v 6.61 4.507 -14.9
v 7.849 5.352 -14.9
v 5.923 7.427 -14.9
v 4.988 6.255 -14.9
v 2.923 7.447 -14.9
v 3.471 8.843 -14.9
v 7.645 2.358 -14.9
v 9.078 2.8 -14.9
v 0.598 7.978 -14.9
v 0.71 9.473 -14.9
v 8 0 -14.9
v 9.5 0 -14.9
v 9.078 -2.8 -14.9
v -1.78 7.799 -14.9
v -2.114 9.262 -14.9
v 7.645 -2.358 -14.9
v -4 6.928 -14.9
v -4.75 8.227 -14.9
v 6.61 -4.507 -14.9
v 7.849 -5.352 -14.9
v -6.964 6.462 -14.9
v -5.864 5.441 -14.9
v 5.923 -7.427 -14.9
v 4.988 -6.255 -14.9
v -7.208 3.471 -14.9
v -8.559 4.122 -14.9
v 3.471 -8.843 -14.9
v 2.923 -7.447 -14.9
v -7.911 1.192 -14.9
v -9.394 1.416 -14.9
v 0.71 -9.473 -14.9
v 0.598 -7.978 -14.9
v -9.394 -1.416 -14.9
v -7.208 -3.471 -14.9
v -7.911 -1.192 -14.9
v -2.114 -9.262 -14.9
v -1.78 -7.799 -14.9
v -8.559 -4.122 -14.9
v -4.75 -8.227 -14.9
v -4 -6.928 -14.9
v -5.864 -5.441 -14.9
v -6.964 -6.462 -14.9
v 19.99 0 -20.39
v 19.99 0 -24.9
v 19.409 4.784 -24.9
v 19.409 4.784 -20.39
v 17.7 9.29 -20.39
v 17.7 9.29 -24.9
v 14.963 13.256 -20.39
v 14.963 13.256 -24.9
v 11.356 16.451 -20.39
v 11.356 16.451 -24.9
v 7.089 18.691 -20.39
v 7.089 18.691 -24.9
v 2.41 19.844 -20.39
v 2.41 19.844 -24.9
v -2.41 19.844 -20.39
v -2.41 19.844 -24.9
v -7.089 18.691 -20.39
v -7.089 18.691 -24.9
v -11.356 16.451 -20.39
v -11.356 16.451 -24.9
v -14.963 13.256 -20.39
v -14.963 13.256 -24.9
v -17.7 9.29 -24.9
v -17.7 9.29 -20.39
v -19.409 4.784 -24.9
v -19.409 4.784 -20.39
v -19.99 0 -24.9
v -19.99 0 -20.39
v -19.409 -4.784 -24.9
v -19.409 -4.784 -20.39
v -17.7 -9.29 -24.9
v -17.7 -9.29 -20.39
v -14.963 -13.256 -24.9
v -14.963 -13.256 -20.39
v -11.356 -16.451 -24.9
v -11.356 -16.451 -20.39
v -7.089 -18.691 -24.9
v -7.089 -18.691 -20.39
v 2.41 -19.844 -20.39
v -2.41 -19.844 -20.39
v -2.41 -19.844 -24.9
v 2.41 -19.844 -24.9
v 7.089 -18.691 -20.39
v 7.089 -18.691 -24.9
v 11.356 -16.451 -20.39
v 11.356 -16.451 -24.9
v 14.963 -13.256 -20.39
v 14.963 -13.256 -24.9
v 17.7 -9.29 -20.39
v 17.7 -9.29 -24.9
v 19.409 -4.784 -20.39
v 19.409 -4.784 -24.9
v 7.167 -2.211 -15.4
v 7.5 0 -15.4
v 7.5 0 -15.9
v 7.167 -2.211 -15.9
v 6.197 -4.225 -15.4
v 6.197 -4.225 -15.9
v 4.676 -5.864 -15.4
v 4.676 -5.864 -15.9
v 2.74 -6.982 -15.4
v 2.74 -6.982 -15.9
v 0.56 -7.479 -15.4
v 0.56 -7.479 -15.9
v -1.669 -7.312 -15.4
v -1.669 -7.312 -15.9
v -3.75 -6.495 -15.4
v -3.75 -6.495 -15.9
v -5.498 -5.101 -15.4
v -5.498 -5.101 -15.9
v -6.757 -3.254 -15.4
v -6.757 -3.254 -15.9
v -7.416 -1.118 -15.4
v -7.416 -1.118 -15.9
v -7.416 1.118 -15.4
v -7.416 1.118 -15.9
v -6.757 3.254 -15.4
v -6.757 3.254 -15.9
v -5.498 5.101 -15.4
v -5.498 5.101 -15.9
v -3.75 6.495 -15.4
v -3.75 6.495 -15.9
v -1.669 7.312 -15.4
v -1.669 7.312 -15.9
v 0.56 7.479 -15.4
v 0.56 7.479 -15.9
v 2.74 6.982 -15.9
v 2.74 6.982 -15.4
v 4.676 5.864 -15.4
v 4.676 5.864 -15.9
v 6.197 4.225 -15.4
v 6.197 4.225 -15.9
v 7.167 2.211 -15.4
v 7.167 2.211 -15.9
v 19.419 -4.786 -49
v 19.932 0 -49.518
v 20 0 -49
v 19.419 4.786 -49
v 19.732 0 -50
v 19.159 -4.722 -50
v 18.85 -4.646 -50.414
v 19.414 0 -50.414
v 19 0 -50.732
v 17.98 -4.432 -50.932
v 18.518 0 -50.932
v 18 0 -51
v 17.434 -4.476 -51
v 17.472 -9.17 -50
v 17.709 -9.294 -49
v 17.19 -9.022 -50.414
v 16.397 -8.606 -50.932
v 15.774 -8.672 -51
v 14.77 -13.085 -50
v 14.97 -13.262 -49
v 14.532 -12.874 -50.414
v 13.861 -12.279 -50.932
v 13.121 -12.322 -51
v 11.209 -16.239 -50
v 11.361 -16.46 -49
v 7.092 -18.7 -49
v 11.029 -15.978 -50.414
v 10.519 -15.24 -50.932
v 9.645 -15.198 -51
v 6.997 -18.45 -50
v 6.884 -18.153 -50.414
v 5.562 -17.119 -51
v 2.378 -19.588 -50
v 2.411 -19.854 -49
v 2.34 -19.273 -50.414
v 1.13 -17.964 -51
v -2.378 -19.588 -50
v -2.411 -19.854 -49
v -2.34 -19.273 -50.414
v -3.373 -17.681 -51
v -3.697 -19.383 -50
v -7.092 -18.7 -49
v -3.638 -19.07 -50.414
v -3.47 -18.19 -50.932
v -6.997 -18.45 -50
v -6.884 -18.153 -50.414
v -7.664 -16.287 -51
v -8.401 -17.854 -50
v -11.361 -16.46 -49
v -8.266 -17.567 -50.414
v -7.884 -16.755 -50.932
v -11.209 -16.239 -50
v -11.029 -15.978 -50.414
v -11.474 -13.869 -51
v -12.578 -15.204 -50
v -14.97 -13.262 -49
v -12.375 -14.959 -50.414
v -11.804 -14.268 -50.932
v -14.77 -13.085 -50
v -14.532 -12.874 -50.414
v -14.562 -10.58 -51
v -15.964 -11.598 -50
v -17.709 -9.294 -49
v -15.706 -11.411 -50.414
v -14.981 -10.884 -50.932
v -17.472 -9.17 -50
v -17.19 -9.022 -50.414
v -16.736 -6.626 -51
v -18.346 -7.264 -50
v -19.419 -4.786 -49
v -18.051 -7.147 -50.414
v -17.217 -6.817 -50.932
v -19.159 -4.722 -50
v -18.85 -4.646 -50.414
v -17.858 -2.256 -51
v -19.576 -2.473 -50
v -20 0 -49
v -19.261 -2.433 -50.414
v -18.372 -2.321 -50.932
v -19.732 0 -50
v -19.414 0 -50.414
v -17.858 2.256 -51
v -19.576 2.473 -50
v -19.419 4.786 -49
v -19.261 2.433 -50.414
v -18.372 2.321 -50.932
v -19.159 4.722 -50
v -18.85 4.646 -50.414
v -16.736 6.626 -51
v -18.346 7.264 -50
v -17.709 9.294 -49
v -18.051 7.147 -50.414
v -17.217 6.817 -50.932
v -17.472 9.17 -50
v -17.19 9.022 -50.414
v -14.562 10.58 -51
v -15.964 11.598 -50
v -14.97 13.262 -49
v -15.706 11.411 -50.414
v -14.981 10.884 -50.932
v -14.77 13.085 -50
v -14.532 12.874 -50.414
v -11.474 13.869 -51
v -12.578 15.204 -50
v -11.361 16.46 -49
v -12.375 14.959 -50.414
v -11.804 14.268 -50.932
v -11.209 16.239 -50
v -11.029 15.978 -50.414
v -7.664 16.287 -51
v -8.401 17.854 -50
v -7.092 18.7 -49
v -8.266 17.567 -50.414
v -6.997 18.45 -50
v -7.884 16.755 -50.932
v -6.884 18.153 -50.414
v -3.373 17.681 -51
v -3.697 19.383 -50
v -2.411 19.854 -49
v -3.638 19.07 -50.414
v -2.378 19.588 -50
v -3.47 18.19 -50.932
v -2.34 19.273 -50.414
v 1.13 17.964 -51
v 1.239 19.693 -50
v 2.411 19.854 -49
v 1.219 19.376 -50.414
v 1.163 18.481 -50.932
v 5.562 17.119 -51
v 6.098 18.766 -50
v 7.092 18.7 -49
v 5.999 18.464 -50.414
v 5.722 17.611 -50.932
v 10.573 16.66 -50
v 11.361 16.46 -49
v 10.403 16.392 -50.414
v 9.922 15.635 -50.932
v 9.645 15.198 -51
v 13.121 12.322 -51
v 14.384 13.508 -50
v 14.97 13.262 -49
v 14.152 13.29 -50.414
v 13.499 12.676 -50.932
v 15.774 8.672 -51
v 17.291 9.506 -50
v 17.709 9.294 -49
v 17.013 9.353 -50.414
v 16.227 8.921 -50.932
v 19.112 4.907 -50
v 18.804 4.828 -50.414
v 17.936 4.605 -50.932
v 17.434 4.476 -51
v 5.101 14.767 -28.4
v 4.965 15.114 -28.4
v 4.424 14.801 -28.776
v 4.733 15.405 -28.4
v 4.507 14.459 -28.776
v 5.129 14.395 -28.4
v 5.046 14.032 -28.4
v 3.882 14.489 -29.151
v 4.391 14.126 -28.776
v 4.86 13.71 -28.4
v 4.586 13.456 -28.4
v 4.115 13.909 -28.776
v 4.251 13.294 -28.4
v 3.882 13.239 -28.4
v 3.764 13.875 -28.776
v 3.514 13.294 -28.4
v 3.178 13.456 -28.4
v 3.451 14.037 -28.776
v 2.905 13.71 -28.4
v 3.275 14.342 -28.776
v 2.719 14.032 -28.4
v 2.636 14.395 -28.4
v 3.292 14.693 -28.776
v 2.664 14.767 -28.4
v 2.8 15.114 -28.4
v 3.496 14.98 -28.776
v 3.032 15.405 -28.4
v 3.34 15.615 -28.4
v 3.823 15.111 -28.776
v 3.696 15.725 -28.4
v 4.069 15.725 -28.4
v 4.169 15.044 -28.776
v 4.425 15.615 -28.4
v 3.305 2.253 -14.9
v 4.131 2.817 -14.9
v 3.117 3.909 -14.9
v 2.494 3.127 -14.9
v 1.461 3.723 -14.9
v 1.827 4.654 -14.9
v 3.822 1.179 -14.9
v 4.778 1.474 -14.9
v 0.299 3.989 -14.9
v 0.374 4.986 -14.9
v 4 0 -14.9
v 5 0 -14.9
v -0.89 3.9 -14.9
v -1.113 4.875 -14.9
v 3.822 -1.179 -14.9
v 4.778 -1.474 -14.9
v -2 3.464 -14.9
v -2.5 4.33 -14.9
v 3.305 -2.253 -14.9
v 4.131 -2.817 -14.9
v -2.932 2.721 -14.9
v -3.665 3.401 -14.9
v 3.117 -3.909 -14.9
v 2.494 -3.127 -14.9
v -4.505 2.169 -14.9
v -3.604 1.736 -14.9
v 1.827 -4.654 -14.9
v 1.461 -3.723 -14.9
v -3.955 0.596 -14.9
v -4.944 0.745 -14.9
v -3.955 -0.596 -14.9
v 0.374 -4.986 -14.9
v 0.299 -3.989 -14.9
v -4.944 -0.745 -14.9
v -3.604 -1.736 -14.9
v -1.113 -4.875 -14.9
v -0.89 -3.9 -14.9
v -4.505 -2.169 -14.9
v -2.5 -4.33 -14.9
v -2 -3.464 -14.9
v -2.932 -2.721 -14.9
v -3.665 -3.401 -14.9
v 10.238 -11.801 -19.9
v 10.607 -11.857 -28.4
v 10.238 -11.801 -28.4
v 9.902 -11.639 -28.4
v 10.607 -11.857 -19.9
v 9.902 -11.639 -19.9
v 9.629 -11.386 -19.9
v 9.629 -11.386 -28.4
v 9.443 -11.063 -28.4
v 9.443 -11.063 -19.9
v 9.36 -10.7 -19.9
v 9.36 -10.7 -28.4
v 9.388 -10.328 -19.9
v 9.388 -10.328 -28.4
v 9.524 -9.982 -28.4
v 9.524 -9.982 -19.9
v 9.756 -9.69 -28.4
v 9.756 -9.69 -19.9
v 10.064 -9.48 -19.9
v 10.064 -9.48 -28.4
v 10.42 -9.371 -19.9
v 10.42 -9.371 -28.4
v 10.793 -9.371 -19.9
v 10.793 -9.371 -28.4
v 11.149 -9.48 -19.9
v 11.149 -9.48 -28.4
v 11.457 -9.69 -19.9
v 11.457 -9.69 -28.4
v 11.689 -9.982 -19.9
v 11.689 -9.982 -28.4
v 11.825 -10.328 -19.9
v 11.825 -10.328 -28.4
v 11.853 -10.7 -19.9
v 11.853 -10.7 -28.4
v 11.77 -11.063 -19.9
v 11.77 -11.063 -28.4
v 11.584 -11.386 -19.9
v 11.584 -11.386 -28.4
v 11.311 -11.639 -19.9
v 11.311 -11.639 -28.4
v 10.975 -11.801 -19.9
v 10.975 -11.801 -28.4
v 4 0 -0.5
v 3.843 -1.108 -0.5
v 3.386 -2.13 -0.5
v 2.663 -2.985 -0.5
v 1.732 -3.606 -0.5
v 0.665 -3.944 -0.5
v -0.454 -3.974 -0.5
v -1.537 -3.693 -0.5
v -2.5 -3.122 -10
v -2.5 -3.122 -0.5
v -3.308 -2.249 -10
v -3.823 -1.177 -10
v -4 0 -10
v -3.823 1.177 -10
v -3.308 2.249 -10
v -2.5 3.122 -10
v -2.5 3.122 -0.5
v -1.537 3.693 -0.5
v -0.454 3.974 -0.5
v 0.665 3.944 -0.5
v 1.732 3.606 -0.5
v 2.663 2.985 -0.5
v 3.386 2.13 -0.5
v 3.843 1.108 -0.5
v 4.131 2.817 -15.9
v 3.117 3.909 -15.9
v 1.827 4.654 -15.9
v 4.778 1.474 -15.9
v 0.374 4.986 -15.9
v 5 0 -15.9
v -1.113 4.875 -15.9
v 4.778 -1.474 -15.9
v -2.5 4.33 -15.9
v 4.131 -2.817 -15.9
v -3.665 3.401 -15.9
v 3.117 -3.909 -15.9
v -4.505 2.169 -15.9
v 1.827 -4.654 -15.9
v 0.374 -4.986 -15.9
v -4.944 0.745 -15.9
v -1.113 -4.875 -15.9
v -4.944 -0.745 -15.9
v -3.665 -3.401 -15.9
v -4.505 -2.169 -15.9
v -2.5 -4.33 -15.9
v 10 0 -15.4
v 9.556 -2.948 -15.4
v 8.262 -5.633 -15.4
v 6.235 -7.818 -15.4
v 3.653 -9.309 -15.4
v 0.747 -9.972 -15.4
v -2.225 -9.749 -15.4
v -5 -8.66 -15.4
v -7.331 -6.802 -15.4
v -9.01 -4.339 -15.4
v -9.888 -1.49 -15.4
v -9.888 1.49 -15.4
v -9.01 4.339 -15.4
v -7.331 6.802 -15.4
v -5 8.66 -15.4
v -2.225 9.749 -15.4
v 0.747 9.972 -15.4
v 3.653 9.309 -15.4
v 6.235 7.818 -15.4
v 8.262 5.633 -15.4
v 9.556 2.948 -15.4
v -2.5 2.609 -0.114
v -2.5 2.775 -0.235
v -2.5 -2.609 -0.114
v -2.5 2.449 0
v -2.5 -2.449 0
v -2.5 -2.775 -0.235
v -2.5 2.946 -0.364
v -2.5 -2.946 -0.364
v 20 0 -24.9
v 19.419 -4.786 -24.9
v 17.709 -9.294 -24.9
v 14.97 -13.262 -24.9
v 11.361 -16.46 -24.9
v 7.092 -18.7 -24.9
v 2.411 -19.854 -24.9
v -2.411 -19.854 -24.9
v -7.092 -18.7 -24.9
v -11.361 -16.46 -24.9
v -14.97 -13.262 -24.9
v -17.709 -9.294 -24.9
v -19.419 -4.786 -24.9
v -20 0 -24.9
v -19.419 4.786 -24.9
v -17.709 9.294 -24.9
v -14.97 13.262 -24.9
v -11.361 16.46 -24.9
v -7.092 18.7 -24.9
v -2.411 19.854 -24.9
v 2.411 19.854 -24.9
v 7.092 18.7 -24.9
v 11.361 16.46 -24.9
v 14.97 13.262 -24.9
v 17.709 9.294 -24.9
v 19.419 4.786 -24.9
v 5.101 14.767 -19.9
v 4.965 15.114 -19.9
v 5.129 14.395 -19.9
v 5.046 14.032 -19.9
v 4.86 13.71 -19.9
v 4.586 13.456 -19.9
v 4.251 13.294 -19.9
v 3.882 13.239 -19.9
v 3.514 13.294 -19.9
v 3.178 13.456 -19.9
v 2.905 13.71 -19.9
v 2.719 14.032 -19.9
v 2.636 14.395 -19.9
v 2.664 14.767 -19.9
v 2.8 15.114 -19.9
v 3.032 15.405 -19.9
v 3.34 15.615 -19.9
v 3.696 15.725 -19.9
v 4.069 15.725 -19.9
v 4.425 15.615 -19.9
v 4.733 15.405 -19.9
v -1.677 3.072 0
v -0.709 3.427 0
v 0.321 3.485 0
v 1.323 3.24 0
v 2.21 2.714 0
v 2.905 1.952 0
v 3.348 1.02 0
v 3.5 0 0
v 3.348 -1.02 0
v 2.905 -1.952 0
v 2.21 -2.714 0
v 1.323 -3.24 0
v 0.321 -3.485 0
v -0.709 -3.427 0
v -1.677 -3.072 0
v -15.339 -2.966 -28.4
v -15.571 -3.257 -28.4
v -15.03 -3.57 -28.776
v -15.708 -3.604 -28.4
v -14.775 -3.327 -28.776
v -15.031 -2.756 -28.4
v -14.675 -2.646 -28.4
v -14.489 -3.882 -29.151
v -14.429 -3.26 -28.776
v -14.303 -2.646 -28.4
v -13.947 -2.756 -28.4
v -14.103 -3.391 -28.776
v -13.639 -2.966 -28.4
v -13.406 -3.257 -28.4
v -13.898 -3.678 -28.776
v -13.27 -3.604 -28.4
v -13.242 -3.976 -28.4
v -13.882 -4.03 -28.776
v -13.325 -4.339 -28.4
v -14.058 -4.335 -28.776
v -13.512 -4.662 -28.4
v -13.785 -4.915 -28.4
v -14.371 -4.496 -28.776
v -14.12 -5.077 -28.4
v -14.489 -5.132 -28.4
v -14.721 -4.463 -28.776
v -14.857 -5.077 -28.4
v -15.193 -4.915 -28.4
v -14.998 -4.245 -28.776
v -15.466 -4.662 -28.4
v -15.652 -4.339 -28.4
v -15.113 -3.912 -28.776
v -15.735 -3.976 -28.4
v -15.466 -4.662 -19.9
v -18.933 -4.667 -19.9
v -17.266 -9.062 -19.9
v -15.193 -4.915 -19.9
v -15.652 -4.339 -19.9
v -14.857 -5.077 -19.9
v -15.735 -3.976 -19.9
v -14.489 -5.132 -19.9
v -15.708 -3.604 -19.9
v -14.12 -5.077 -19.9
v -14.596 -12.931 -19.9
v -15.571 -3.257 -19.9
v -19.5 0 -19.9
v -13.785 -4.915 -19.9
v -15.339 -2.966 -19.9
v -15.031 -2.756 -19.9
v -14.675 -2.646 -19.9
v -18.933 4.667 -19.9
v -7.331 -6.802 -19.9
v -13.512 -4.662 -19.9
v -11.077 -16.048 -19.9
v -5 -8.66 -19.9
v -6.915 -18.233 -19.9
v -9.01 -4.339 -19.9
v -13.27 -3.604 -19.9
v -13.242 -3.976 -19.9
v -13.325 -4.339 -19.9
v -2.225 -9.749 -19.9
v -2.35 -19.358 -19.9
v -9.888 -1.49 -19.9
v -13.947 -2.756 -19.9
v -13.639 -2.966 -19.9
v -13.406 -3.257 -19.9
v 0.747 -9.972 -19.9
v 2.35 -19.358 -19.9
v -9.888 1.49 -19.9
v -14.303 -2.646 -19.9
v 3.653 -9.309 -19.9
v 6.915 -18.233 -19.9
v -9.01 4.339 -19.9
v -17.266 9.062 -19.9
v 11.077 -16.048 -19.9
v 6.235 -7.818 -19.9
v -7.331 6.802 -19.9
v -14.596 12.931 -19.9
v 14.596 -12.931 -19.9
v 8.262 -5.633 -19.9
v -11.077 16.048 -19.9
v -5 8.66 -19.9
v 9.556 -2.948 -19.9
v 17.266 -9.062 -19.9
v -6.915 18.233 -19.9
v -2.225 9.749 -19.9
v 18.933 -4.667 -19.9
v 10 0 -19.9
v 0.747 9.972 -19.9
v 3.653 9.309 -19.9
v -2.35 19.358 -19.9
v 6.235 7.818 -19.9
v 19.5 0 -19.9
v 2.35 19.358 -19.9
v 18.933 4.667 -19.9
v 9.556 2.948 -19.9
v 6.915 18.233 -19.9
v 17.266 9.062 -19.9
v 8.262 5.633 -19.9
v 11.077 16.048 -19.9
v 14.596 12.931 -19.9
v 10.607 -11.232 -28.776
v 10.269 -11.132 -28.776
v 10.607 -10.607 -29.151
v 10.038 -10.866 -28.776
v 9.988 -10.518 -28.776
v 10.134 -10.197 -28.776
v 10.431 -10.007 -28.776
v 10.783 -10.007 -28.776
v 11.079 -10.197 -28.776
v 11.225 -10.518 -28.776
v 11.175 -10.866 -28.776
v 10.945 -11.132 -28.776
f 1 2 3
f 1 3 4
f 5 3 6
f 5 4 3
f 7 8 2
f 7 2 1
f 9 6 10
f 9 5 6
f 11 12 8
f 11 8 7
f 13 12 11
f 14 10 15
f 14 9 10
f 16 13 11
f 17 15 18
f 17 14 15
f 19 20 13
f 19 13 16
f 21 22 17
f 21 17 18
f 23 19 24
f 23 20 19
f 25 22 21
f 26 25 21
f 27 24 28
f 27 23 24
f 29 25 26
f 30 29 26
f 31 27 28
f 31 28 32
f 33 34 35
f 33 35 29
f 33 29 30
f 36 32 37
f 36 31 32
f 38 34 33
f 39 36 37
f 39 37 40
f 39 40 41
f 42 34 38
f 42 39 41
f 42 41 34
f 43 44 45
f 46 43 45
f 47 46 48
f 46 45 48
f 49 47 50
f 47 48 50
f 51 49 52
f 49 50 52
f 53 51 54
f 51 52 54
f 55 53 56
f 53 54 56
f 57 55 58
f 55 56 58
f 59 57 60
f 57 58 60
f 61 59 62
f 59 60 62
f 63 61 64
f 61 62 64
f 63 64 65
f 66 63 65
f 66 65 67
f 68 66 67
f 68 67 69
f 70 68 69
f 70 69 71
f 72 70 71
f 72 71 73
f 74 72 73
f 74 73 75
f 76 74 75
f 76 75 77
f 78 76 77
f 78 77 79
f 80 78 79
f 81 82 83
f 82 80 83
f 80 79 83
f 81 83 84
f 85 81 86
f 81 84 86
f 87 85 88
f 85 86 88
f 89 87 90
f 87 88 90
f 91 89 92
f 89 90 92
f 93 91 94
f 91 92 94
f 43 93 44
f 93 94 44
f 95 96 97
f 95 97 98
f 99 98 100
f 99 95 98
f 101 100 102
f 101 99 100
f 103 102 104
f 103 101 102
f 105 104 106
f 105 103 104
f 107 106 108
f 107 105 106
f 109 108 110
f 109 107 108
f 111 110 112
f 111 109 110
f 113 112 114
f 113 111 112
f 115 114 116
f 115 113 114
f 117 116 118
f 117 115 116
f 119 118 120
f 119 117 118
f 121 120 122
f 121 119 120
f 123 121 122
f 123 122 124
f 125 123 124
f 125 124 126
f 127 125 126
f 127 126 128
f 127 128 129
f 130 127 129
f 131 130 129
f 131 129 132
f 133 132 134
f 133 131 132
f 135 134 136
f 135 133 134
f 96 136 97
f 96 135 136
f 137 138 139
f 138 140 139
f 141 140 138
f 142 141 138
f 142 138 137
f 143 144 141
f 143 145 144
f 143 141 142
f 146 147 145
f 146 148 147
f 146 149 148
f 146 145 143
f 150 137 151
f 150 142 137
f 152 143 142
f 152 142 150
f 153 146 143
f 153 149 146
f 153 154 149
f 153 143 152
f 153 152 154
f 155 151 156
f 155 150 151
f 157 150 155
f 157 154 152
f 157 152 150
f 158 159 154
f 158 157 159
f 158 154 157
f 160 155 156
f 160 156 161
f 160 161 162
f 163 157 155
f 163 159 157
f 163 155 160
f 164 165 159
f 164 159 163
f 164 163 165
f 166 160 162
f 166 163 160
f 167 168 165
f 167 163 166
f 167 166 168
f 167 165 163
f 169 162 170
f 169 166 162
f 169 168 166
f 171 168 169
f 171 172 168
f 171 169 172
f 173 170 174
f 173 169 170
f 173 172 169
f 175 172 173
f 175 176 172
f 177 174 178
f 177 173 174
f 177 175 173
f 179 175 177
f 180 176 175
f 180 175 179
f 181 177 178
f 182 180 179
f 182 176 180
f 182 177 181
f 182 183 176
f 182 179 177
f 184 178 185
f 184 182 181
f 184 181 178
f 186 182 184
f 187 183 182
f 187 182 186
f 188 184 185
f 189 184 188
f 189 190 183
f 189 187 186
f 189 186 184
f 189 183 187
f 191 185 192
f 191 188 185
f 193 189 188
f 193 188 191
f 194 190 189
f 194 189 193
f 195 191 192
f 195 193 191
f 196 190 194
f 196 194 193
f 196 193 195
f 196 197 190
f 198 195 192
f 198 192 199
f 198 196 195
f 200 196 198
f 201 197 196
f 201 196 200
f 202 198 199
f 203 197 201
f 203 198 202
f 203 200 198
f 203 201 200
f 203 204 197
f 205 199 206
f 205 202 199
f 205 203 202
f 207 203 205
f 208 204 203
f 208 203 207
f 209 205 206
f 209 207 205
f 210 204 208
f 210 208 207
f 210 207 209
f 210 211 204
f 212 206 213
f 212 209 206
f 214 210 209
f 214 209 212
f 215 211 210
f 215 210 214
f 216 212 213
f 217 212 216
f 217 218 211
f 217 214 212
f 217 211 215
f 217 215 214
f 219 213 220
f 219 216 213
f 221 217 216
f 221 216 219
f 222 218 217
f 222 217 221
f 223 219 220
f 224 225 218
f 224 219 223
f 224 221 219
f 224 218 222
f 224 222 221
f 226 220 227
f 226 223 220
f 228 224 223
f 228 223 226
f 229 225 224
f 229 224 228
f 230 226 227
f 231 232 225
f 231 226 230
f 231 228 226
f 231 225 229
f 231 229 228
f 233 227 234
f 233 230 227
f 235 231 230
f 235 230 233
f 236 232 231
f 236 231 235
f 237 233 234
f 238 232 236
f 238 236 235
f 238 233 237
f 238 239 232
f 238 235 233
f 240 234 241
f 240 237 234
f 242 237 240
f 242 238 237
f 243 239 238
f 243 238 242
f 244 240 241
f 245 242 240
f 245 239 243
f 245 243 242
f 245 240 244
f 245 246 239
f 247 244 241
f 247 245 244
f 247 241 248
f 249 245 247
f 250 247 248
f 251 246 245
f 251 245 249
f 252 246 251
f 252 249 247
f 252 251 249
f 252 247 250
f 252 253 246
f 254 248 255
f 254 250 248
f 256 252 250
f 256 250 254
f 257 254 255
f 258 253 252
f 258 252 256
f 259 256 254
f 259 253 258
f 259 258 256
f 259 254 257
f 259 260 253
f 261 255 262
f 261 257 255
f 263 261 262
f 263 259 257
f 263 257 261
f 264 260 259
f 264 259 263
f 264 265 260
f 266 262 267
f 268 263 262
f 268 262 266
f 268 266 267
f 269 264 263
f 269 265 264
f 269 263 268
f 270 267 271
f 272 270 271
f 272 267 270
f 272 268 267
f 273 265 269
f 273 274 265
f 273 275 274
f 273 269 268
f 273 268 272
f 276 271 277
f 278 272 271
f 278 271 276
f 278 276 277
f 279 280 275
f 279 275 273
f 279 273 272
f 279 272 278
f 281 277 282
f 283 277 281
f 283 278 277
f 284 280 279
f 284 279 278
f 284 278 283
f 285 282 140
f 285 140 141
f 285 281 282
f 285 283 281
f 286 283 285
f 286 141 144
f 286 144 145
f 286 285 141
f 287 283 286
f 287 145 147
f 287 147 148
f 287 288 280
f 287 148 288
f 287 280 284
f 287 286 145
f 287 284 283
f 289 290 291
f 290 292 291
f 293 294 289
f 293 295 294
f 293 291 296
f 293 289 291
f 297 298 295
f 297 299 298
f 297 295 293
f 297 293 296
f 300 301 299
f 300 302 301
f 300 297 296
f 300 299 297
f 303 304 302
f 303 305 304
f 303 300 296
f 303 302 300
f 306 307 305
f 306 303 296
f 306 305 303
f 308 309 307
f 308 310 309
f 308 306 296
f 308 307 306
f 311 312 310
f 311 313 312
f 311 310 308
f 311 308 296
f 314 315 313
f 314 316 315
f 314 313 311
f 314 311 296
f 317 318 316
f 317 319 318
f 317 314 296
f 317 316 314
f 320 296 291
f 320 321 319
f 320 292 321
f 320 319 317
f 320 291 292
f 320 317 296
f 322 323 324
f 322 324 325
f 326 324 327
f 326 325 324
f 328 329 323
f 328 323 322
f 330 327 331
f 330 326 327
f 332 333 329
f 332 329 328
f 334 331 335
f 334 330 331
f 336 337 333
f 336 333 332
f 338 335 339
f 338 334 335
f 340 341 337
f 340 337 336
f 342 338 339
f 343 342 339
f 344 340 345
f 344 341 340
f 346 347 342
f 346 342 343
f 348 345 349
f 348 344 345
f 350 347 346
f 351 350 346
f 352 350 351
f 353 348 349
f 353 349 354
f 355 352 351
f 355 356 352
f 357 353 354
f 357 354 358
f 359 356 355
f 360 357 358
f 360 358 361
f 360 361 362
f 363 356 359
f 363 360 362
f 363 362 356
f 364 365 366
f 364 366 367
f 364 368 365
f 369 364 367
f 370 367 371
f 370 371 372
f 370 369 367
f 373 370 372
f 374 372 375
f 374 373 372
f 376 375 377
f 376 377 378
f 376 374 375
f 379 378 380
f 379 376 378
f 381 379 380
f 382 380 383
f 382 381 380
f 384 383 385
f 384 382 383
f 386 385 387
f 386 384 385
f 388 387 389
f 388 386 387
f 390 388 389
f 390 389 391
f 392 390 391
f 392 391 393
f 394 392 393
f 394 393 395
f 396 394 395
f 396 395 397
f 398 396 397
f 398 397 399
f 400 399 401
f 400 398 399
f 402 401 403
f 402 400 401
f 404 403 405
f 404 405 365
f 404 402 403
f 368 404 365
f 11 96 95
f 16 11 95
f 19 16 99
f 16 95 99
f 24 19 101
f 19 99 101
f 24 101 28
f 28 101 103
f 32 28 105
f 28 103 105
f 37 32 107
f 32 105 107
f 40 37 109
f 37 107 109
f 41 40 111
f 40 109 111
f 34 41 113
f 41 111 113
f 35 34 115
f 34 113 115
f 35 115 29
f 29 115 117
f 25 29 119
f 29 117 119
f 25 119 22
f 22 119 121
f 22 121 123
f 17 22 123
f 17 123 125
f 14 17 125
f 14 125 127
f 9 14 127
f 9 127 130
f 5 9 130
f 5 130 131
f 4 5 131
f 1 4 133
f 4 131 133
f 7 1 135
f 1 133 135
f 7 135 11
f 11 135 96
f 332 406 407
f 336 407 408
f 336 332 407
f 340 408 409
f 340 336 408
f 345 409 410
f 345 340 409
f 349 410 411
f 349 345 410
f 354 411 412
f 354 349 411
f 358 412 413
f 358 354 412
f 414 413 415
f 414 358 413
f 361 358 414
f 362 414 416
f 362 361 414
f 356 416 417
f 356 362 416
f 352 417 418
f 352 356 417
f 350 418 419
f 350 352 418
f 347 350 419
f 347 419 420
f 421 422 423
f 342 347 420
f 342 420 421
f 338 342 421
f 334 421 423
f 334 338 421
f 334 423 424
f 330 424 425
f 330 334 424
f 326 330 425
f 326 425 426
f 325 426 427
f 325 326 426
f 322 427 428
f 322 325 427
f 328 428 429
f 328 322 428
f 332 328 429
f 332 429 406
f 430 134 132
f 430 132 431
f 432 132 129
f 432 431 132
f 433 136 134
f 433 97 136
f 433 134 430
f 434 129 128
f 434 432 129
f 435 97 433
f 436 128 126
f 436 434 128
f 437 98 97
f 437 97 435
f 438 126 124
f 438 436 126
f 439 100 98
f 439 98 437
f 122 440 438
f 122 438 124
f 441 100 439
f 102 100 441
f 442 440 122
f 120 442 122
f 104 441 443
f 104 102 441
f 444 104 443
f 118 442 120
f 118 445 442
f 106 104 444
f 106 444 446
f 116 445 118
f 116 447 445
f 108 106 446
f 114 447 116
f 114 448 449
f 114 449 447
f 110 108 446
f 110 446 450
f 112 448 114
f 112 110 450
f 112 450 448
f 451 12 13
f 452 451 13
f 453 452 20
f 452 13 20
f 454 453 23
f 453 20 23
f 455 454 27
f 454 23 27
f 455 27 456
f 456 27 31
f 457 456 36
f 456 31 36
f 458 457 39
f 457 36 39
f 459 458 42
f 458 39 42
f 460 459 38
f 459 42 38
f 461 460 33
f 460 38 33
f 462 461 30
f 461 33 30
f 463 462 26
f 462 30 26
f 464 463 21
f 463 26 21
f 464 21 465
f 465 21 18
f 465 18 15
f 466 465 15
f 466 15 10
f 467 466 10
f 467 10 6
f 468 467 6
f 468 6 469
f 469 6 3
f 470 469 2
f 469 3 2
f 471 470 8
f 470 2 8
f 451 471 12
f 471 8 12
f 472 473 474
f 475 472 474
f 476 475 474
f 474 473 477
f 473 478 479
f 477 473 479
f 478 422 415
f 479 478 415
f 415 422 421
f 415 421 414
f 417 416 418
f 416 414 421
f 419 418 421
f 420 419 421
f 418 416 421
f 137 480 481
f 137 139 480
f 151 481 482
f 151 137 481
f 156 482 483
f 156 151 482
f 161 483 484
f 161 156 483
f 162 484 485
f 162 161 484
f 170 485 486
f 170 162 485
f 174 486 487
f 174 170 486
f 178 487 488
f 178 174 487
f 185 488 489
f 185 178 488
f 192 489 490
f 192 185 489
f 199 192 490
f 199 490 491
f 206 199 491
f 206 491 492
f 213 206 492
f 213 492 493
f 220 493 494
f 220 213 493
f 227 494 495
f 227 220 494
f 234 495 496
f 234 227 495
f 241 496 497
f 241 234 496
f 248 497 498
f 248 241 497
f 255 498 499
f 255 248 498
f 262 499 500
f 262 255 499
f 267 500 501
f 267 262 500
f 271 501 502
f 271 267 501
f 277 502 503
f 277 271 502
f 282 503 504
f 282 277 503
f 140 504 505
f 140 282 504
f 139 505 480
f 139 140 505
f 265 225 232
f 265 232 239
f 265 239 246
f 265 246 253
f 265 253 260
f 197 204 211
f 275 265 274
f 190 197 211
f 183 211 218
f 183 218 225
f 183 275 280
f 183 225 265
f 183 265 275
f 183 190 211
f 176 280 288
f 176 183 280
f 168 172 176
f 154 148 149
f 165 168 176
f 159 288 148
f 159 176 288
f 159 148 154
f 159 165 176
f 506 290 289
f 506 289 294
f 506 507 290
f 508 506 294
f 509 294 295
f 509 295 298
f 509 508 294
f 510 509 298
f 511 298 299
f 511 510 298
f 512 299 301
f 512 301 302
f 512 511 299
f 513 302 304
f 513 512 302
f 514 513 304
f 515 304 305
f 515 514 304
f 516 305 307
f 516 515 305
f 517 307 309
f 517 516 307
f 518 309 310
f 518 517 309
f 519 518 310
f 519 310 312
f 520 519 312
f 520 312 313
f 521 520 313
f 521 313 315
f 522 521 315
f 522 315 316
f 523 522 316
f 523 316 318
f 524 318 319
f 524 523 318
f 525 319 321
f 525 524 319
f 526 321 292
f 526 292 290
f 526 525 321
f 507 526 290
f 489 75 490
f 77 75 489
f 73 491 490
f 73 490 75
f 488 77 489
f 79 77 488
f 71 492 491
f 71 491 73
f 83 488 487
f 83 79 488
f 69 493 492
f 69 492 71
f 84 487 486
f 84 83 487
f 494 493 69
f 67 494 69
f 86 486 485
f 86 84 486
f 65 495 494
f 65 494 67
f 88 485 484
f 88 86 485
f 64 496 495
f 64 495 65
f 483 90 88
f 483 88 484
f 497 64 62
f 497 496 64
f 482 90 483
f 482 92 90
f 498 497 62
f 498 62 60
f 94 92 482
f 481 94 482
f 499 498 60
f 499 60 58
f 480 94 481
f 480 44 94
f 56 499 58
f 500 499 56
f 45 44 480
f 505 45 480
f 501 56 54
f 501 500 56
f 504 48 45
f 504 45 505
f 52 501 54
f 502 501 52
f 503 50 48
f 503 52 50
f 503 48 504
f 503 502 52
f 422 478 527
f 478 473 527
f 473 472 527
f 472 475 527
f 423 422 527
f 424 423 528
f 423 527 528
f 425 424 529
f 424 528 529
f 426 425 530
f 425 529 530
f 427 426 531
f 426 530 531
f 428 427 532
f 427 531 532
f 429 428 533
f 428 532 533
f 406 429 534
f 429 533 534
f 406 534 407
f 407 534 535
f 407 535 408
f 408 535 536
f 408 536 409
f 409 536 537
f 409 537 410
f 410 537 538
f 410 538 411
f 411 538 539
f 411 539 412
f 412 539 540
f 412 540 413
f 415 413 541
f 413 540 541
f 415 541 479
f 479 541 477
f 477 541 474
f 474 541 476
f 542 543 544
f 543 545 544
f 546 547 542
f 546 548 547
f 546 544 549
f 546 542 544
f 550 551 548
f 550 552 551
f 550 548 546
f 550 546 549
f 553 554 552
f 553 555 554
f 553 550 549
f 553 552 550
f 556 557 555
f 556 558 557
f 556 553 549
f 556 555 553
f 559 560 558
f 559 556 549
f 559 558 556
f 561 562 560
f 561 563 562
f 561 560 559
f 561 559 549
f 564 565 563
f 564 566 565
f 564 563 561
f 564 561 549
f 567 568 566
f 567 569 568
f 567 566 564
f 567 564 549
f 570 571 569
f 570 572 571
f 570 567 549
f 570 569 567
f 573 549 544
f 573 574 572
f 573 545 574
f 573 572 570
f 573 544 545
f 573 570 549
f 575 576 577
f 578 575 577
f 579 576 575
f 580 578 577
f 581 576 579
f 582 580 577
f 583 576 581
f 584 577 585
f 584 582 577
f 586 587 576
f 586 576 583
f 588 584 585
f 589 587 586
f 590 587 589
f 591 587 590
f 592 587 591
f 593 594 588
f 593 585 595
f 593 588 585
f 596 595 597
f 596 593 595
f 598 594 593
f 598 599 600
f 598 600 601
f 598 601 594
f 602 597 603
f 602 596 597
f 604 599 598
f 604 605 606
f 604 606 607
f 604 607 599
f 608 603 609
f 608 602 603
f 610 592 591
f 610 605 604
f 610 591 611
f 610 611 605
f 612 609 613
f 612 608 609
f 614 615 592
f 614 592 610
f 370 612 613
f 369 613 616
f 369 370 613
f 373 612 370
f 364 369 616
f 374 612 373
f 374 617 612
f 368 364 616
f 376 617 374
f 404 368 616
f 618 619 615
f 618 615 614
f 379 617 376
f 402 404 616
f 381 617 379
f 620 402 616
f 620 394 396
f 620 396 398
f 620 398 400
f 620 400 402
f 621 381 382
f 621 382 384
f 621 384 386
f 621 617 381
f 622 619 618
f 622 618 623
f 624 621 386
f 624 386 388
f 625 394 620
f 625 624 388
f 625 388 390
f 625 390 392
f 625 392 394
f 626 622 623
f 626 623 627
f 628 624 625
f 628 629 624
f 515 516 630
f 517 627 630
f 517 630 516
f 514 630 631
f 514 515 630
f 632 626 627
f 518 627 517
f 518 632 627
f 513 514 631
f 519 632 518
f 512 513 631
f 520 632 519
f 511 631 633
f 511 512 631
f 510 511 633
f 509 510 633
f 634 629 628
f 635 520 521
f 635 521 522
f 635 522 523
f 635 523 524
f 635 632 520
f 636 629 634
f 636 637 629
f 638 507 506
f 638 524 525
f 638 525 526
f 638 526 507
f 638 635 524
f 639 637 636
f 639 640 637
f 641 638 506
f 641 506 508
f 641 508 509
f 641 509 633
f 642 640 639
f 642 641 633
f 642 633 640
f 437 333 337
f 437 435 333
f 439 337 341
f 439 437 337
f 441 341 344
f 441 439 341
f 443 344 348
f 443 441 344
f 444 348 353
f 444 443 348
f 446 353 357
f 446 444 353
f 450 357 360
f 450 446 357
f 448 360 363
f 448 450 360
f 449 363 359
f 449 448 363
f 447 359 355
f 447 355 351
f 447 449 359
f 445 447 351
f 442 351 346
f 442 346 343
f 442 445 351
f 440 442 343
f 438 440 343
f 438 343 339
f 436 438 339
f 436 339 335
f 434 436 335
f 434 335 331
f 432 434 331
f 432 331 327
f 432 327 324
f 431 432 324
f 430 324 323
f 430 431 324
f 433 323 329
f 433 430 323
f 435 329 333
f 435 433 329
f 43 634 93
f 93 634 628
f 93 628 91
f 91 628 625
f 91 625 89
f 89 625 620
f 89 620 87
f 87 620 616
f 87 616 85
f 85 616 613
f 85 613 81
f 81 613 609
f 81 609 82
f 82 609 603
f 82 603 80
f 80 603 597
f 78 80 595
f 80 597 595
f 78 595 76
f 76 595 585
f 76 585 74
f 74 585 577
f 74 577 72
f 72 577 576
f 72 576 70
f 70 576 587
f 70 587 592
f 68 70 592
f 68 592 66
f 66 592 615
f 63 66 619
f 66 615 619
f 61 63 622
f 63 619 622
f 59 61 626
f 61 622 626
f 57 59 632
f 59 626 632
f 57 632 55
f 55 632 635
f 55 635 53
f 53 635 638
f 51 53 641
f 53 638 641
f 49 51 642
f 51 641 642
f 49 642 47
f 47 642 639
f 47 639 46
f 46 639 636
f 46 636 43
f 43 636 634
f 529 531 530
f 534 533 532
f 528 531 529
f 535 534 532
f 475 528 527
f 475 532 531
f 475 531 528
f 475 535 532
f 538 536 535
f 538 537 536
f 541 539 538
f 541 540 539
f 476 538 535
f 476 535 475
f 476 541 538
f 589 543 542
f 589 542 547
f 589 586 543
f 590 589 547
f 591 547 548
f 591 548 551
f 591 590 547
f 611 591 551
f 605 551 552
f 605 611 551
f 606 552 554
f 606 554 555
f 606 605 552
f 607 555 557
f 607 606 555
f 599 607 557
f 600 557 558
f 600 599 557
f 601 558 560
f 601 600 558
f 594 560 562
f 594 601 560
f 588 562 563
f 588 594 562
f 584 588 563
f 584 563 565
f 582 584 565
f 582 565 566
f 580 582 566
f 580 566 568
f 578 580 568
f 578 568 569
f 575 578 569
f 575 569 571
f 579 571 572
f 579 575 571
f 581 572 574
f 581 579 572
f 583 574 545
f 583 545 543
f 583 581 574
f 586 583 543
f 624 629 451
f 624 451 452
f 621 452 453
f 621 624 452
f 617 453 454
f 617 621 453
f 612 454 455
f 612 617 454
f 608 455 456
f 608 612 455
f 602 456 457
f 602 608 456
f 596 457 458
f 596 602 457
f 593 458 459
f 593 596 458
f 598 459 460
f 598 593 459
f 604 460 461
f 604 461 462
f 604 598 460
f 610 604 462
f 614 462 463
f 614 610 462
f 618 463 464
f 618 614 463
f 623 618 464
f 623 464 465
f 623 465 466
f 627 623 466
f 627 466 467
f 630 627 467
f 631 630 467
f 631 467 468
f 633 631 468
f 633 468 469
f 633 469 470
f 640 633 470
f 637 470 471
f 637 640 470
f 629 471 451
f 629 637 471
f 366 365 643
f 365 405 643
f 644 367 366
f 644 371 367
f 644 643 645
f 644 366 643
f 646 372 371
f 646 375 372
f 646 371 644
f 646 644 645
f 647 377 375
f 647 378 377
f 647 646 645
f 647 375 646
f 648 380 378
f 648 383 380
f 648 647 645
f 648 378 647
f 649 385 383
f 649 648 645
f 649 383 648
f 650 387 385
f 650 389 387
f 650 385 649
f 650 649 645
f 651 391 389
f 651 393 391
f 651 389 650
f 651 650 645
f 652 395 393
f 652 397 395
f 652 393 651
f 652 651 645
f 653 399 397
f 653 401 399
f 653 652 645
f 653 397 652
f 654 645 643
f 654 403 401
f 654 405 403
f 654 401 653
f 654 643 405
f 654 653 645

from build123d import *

# Parameters (mm, degrees)
FILLET3_R                      = 2
CUT_EXTRUDE11_START            = -10
CUT_EXTRUDE11_DEPTH            = 10
CHAMFER6_SIZE                  = 0.5
M3X0_5_TAPPED_HOLE1_AT_2_COUNT = 2
M3X0_5_TAPPED_HOLE1_AT_2_PITCH = 11.136209045
CIRPATTERN4_COUNT              = 3
SKETCH43_R                     = 1.25
EXTRUDE13_DEPTH                = 15
CUT_EXTRUDE13_START            = -5
SKETCH44_R                     = 20
SKETCH44_R_2                   = 19.99
CUT_EXTRUDE13_DEPTH            = 5


with BuildPart() as part:
    # Sketch37 → Revolve3 (revolve)
    with BuildSketch(Plane(origin=(0, 0, 0), x_dir=(0, 0, -1), z_dir=(1, 0, 0)), mode=Mode.PRIVATE) as revolve3_sk:
        Polygon((0, 0), (0, -4), (14.9, -4), (14.9, -5), (15.9, -5), (15.9, -7.5), (14.9, -7.5), (14.9, -10), (19.9, -10), (19.9, -20), (51, -20), (51, 0), align=None)
    revolve(revolve3_sk.sketch.rotate(Axis((0, 0, 0), (0, 0, -1)), 270), axis=Axis((0, 0, 0), (0, 0, -1)))

    # Fillet3
    fillet3_edges = [part.edges().sort_by_distance(p)[0] for p in [
        (-20, 0, -51),
    ]]
    fillet(fillet3_edges, radius=FILLET3_R)

    # Sketch38 → Cut-Extrude11 (cut)
    with BuildSketch(Plane.XY.offset(CUT_EXTRUDE11_START)):
        with BuildLine():
            Line((-2.5, 3.122498999), (-2.5, -3.122498999))
            ThreePointArc((-2.5, -3.122498999), (-4, 0), (-2.5, 3.122498999))
        make_face()
    extrude(amount=CUT_EXTRUDE11_DEPTH, mode=Mode.SUBTRACT)

    # Chamfer6
    chamfer6_edges = [part.edges().sort_by_distance(p)[0] for p in [
        (-10, 0, -14.9),
        (-7.5, 0, -14.9),
        (1.732050808, 3.605551275, 0),
        (-20, 0, -19.9),
    ]]
    chamfer(chamfer6_edges, length=CHAMFER6_SIZE)

    # Sketch40 → M3x0.5 Tapped Hole1 (revolve, cut)
    with BuildSketch(Plane(origin=(0, -14, -19.9), x_dir=(0, -1, 0), z_dir=(1, 0, 0))):
        Polygon((0, 0), (0, 9.251075774), (1.25, 8.5), (1.25, 0), align=None)
    m3x0_5_tapped_hole1 = revolve(axis=Axis((0, -14, -13.55), (0, 0, -1)), mode=Mode.SUBTRACT)

    # M3x0.5 Tapped Hole1 at 2: M3x0.5 Tapped Hole1 ×2
    with Locations(*[Vector(0.9524427634762035, 0.30471754511647786, 0) * (i * M3X0_5_TAPPED_HOLE1_AT_2_PITCH) for i in range(1, M3X0_5_TAPPED_HOLE1_AT_2_COUNT)]):
        add(m3x0_5_tapped_hole1, mode=Mode.SUBTRACT)

    # CirPattern4: M3x0.5 Tapped Hole1 ×3 about axis
    cirpattern4_axis = Axis((0, 0, 0), (0, 0, 1))
    for i in range(1, CIRPATTERN4_COUNT):
        add(m3x0_5_tapped_hole1.rotate(cirpattern4_axis, i * 360 / CIRPATTERN4_COUNT), mode=Mode.SUBTRACT)

    # CirPattern4 copy 1 sketch → CirPattern4 copy 1 (revolve, cut)
    with BuildSketch(Plane(origin=(3.882285677, 14.488887394, -19.9), x_dir=(0.8660254037844387, 0.4999999999999998, 0), z_dir=(-0.4999999999999998, 0.8660254037844387, 0))):
        Polygon((0, 0), (0, 9.251075774), (1.25, 8.5), (1.25, 0), align=None)
    revolve(axis=Axis((3.882285677, 14.488887394, -13.55), (0, 0, -1)), mode=Mode.SUBTRACT)

    # CirPattern4 copy 2 sketch → CirPattern4 copy 2 (revolve, cut)
    with BuildSketch(Plane(origin=(-14.488887394, -3.882285677, -19.9), x_dir=(-0.8660254037844384, 0.5000000000000004, 0), z_dir=(-0.5000000000000004, -0.8660254037844384, 0))):
        Polygon((0, 0), (0, 9.251075774), (1.25, 8.5), (1.25, 0), align=None)
    revolve(axis=Axis((-14.488887394, -3.882285677, -13.55), (0, 0, -1)), mode=Mode.SUBTRACT)

    # Sketch43 → Extrude13 (add)
    with BuildSketch(Plane.XY.offset(-19.9)):
        with Locations((0, -14)):
            Circle(SKETCH43_R)
        with Locations((-12.124355653, 7)):
            Circle(SKETCH43_R)
        with Locations((12.124355653, 7)):
            Circle(SKETCH43_R)
    extrude(amount=-EXTRUDE13_DEPTH)

    # Sketch44 → Cut-Extrude13 (cut)
    with BuildSketch(Plane.XY.offset(-19.9).offset(CUT_EXTRUDE13_START)):
        Circle(SKETCH44_R)
        Circle(SKETCH44_R_2, mode=Mode.SUBTRACT)
    extrude(amount=CUT_EXTRUDE13_DEPTH, mode=Mode.SUBTRACT)


solid = part.part
